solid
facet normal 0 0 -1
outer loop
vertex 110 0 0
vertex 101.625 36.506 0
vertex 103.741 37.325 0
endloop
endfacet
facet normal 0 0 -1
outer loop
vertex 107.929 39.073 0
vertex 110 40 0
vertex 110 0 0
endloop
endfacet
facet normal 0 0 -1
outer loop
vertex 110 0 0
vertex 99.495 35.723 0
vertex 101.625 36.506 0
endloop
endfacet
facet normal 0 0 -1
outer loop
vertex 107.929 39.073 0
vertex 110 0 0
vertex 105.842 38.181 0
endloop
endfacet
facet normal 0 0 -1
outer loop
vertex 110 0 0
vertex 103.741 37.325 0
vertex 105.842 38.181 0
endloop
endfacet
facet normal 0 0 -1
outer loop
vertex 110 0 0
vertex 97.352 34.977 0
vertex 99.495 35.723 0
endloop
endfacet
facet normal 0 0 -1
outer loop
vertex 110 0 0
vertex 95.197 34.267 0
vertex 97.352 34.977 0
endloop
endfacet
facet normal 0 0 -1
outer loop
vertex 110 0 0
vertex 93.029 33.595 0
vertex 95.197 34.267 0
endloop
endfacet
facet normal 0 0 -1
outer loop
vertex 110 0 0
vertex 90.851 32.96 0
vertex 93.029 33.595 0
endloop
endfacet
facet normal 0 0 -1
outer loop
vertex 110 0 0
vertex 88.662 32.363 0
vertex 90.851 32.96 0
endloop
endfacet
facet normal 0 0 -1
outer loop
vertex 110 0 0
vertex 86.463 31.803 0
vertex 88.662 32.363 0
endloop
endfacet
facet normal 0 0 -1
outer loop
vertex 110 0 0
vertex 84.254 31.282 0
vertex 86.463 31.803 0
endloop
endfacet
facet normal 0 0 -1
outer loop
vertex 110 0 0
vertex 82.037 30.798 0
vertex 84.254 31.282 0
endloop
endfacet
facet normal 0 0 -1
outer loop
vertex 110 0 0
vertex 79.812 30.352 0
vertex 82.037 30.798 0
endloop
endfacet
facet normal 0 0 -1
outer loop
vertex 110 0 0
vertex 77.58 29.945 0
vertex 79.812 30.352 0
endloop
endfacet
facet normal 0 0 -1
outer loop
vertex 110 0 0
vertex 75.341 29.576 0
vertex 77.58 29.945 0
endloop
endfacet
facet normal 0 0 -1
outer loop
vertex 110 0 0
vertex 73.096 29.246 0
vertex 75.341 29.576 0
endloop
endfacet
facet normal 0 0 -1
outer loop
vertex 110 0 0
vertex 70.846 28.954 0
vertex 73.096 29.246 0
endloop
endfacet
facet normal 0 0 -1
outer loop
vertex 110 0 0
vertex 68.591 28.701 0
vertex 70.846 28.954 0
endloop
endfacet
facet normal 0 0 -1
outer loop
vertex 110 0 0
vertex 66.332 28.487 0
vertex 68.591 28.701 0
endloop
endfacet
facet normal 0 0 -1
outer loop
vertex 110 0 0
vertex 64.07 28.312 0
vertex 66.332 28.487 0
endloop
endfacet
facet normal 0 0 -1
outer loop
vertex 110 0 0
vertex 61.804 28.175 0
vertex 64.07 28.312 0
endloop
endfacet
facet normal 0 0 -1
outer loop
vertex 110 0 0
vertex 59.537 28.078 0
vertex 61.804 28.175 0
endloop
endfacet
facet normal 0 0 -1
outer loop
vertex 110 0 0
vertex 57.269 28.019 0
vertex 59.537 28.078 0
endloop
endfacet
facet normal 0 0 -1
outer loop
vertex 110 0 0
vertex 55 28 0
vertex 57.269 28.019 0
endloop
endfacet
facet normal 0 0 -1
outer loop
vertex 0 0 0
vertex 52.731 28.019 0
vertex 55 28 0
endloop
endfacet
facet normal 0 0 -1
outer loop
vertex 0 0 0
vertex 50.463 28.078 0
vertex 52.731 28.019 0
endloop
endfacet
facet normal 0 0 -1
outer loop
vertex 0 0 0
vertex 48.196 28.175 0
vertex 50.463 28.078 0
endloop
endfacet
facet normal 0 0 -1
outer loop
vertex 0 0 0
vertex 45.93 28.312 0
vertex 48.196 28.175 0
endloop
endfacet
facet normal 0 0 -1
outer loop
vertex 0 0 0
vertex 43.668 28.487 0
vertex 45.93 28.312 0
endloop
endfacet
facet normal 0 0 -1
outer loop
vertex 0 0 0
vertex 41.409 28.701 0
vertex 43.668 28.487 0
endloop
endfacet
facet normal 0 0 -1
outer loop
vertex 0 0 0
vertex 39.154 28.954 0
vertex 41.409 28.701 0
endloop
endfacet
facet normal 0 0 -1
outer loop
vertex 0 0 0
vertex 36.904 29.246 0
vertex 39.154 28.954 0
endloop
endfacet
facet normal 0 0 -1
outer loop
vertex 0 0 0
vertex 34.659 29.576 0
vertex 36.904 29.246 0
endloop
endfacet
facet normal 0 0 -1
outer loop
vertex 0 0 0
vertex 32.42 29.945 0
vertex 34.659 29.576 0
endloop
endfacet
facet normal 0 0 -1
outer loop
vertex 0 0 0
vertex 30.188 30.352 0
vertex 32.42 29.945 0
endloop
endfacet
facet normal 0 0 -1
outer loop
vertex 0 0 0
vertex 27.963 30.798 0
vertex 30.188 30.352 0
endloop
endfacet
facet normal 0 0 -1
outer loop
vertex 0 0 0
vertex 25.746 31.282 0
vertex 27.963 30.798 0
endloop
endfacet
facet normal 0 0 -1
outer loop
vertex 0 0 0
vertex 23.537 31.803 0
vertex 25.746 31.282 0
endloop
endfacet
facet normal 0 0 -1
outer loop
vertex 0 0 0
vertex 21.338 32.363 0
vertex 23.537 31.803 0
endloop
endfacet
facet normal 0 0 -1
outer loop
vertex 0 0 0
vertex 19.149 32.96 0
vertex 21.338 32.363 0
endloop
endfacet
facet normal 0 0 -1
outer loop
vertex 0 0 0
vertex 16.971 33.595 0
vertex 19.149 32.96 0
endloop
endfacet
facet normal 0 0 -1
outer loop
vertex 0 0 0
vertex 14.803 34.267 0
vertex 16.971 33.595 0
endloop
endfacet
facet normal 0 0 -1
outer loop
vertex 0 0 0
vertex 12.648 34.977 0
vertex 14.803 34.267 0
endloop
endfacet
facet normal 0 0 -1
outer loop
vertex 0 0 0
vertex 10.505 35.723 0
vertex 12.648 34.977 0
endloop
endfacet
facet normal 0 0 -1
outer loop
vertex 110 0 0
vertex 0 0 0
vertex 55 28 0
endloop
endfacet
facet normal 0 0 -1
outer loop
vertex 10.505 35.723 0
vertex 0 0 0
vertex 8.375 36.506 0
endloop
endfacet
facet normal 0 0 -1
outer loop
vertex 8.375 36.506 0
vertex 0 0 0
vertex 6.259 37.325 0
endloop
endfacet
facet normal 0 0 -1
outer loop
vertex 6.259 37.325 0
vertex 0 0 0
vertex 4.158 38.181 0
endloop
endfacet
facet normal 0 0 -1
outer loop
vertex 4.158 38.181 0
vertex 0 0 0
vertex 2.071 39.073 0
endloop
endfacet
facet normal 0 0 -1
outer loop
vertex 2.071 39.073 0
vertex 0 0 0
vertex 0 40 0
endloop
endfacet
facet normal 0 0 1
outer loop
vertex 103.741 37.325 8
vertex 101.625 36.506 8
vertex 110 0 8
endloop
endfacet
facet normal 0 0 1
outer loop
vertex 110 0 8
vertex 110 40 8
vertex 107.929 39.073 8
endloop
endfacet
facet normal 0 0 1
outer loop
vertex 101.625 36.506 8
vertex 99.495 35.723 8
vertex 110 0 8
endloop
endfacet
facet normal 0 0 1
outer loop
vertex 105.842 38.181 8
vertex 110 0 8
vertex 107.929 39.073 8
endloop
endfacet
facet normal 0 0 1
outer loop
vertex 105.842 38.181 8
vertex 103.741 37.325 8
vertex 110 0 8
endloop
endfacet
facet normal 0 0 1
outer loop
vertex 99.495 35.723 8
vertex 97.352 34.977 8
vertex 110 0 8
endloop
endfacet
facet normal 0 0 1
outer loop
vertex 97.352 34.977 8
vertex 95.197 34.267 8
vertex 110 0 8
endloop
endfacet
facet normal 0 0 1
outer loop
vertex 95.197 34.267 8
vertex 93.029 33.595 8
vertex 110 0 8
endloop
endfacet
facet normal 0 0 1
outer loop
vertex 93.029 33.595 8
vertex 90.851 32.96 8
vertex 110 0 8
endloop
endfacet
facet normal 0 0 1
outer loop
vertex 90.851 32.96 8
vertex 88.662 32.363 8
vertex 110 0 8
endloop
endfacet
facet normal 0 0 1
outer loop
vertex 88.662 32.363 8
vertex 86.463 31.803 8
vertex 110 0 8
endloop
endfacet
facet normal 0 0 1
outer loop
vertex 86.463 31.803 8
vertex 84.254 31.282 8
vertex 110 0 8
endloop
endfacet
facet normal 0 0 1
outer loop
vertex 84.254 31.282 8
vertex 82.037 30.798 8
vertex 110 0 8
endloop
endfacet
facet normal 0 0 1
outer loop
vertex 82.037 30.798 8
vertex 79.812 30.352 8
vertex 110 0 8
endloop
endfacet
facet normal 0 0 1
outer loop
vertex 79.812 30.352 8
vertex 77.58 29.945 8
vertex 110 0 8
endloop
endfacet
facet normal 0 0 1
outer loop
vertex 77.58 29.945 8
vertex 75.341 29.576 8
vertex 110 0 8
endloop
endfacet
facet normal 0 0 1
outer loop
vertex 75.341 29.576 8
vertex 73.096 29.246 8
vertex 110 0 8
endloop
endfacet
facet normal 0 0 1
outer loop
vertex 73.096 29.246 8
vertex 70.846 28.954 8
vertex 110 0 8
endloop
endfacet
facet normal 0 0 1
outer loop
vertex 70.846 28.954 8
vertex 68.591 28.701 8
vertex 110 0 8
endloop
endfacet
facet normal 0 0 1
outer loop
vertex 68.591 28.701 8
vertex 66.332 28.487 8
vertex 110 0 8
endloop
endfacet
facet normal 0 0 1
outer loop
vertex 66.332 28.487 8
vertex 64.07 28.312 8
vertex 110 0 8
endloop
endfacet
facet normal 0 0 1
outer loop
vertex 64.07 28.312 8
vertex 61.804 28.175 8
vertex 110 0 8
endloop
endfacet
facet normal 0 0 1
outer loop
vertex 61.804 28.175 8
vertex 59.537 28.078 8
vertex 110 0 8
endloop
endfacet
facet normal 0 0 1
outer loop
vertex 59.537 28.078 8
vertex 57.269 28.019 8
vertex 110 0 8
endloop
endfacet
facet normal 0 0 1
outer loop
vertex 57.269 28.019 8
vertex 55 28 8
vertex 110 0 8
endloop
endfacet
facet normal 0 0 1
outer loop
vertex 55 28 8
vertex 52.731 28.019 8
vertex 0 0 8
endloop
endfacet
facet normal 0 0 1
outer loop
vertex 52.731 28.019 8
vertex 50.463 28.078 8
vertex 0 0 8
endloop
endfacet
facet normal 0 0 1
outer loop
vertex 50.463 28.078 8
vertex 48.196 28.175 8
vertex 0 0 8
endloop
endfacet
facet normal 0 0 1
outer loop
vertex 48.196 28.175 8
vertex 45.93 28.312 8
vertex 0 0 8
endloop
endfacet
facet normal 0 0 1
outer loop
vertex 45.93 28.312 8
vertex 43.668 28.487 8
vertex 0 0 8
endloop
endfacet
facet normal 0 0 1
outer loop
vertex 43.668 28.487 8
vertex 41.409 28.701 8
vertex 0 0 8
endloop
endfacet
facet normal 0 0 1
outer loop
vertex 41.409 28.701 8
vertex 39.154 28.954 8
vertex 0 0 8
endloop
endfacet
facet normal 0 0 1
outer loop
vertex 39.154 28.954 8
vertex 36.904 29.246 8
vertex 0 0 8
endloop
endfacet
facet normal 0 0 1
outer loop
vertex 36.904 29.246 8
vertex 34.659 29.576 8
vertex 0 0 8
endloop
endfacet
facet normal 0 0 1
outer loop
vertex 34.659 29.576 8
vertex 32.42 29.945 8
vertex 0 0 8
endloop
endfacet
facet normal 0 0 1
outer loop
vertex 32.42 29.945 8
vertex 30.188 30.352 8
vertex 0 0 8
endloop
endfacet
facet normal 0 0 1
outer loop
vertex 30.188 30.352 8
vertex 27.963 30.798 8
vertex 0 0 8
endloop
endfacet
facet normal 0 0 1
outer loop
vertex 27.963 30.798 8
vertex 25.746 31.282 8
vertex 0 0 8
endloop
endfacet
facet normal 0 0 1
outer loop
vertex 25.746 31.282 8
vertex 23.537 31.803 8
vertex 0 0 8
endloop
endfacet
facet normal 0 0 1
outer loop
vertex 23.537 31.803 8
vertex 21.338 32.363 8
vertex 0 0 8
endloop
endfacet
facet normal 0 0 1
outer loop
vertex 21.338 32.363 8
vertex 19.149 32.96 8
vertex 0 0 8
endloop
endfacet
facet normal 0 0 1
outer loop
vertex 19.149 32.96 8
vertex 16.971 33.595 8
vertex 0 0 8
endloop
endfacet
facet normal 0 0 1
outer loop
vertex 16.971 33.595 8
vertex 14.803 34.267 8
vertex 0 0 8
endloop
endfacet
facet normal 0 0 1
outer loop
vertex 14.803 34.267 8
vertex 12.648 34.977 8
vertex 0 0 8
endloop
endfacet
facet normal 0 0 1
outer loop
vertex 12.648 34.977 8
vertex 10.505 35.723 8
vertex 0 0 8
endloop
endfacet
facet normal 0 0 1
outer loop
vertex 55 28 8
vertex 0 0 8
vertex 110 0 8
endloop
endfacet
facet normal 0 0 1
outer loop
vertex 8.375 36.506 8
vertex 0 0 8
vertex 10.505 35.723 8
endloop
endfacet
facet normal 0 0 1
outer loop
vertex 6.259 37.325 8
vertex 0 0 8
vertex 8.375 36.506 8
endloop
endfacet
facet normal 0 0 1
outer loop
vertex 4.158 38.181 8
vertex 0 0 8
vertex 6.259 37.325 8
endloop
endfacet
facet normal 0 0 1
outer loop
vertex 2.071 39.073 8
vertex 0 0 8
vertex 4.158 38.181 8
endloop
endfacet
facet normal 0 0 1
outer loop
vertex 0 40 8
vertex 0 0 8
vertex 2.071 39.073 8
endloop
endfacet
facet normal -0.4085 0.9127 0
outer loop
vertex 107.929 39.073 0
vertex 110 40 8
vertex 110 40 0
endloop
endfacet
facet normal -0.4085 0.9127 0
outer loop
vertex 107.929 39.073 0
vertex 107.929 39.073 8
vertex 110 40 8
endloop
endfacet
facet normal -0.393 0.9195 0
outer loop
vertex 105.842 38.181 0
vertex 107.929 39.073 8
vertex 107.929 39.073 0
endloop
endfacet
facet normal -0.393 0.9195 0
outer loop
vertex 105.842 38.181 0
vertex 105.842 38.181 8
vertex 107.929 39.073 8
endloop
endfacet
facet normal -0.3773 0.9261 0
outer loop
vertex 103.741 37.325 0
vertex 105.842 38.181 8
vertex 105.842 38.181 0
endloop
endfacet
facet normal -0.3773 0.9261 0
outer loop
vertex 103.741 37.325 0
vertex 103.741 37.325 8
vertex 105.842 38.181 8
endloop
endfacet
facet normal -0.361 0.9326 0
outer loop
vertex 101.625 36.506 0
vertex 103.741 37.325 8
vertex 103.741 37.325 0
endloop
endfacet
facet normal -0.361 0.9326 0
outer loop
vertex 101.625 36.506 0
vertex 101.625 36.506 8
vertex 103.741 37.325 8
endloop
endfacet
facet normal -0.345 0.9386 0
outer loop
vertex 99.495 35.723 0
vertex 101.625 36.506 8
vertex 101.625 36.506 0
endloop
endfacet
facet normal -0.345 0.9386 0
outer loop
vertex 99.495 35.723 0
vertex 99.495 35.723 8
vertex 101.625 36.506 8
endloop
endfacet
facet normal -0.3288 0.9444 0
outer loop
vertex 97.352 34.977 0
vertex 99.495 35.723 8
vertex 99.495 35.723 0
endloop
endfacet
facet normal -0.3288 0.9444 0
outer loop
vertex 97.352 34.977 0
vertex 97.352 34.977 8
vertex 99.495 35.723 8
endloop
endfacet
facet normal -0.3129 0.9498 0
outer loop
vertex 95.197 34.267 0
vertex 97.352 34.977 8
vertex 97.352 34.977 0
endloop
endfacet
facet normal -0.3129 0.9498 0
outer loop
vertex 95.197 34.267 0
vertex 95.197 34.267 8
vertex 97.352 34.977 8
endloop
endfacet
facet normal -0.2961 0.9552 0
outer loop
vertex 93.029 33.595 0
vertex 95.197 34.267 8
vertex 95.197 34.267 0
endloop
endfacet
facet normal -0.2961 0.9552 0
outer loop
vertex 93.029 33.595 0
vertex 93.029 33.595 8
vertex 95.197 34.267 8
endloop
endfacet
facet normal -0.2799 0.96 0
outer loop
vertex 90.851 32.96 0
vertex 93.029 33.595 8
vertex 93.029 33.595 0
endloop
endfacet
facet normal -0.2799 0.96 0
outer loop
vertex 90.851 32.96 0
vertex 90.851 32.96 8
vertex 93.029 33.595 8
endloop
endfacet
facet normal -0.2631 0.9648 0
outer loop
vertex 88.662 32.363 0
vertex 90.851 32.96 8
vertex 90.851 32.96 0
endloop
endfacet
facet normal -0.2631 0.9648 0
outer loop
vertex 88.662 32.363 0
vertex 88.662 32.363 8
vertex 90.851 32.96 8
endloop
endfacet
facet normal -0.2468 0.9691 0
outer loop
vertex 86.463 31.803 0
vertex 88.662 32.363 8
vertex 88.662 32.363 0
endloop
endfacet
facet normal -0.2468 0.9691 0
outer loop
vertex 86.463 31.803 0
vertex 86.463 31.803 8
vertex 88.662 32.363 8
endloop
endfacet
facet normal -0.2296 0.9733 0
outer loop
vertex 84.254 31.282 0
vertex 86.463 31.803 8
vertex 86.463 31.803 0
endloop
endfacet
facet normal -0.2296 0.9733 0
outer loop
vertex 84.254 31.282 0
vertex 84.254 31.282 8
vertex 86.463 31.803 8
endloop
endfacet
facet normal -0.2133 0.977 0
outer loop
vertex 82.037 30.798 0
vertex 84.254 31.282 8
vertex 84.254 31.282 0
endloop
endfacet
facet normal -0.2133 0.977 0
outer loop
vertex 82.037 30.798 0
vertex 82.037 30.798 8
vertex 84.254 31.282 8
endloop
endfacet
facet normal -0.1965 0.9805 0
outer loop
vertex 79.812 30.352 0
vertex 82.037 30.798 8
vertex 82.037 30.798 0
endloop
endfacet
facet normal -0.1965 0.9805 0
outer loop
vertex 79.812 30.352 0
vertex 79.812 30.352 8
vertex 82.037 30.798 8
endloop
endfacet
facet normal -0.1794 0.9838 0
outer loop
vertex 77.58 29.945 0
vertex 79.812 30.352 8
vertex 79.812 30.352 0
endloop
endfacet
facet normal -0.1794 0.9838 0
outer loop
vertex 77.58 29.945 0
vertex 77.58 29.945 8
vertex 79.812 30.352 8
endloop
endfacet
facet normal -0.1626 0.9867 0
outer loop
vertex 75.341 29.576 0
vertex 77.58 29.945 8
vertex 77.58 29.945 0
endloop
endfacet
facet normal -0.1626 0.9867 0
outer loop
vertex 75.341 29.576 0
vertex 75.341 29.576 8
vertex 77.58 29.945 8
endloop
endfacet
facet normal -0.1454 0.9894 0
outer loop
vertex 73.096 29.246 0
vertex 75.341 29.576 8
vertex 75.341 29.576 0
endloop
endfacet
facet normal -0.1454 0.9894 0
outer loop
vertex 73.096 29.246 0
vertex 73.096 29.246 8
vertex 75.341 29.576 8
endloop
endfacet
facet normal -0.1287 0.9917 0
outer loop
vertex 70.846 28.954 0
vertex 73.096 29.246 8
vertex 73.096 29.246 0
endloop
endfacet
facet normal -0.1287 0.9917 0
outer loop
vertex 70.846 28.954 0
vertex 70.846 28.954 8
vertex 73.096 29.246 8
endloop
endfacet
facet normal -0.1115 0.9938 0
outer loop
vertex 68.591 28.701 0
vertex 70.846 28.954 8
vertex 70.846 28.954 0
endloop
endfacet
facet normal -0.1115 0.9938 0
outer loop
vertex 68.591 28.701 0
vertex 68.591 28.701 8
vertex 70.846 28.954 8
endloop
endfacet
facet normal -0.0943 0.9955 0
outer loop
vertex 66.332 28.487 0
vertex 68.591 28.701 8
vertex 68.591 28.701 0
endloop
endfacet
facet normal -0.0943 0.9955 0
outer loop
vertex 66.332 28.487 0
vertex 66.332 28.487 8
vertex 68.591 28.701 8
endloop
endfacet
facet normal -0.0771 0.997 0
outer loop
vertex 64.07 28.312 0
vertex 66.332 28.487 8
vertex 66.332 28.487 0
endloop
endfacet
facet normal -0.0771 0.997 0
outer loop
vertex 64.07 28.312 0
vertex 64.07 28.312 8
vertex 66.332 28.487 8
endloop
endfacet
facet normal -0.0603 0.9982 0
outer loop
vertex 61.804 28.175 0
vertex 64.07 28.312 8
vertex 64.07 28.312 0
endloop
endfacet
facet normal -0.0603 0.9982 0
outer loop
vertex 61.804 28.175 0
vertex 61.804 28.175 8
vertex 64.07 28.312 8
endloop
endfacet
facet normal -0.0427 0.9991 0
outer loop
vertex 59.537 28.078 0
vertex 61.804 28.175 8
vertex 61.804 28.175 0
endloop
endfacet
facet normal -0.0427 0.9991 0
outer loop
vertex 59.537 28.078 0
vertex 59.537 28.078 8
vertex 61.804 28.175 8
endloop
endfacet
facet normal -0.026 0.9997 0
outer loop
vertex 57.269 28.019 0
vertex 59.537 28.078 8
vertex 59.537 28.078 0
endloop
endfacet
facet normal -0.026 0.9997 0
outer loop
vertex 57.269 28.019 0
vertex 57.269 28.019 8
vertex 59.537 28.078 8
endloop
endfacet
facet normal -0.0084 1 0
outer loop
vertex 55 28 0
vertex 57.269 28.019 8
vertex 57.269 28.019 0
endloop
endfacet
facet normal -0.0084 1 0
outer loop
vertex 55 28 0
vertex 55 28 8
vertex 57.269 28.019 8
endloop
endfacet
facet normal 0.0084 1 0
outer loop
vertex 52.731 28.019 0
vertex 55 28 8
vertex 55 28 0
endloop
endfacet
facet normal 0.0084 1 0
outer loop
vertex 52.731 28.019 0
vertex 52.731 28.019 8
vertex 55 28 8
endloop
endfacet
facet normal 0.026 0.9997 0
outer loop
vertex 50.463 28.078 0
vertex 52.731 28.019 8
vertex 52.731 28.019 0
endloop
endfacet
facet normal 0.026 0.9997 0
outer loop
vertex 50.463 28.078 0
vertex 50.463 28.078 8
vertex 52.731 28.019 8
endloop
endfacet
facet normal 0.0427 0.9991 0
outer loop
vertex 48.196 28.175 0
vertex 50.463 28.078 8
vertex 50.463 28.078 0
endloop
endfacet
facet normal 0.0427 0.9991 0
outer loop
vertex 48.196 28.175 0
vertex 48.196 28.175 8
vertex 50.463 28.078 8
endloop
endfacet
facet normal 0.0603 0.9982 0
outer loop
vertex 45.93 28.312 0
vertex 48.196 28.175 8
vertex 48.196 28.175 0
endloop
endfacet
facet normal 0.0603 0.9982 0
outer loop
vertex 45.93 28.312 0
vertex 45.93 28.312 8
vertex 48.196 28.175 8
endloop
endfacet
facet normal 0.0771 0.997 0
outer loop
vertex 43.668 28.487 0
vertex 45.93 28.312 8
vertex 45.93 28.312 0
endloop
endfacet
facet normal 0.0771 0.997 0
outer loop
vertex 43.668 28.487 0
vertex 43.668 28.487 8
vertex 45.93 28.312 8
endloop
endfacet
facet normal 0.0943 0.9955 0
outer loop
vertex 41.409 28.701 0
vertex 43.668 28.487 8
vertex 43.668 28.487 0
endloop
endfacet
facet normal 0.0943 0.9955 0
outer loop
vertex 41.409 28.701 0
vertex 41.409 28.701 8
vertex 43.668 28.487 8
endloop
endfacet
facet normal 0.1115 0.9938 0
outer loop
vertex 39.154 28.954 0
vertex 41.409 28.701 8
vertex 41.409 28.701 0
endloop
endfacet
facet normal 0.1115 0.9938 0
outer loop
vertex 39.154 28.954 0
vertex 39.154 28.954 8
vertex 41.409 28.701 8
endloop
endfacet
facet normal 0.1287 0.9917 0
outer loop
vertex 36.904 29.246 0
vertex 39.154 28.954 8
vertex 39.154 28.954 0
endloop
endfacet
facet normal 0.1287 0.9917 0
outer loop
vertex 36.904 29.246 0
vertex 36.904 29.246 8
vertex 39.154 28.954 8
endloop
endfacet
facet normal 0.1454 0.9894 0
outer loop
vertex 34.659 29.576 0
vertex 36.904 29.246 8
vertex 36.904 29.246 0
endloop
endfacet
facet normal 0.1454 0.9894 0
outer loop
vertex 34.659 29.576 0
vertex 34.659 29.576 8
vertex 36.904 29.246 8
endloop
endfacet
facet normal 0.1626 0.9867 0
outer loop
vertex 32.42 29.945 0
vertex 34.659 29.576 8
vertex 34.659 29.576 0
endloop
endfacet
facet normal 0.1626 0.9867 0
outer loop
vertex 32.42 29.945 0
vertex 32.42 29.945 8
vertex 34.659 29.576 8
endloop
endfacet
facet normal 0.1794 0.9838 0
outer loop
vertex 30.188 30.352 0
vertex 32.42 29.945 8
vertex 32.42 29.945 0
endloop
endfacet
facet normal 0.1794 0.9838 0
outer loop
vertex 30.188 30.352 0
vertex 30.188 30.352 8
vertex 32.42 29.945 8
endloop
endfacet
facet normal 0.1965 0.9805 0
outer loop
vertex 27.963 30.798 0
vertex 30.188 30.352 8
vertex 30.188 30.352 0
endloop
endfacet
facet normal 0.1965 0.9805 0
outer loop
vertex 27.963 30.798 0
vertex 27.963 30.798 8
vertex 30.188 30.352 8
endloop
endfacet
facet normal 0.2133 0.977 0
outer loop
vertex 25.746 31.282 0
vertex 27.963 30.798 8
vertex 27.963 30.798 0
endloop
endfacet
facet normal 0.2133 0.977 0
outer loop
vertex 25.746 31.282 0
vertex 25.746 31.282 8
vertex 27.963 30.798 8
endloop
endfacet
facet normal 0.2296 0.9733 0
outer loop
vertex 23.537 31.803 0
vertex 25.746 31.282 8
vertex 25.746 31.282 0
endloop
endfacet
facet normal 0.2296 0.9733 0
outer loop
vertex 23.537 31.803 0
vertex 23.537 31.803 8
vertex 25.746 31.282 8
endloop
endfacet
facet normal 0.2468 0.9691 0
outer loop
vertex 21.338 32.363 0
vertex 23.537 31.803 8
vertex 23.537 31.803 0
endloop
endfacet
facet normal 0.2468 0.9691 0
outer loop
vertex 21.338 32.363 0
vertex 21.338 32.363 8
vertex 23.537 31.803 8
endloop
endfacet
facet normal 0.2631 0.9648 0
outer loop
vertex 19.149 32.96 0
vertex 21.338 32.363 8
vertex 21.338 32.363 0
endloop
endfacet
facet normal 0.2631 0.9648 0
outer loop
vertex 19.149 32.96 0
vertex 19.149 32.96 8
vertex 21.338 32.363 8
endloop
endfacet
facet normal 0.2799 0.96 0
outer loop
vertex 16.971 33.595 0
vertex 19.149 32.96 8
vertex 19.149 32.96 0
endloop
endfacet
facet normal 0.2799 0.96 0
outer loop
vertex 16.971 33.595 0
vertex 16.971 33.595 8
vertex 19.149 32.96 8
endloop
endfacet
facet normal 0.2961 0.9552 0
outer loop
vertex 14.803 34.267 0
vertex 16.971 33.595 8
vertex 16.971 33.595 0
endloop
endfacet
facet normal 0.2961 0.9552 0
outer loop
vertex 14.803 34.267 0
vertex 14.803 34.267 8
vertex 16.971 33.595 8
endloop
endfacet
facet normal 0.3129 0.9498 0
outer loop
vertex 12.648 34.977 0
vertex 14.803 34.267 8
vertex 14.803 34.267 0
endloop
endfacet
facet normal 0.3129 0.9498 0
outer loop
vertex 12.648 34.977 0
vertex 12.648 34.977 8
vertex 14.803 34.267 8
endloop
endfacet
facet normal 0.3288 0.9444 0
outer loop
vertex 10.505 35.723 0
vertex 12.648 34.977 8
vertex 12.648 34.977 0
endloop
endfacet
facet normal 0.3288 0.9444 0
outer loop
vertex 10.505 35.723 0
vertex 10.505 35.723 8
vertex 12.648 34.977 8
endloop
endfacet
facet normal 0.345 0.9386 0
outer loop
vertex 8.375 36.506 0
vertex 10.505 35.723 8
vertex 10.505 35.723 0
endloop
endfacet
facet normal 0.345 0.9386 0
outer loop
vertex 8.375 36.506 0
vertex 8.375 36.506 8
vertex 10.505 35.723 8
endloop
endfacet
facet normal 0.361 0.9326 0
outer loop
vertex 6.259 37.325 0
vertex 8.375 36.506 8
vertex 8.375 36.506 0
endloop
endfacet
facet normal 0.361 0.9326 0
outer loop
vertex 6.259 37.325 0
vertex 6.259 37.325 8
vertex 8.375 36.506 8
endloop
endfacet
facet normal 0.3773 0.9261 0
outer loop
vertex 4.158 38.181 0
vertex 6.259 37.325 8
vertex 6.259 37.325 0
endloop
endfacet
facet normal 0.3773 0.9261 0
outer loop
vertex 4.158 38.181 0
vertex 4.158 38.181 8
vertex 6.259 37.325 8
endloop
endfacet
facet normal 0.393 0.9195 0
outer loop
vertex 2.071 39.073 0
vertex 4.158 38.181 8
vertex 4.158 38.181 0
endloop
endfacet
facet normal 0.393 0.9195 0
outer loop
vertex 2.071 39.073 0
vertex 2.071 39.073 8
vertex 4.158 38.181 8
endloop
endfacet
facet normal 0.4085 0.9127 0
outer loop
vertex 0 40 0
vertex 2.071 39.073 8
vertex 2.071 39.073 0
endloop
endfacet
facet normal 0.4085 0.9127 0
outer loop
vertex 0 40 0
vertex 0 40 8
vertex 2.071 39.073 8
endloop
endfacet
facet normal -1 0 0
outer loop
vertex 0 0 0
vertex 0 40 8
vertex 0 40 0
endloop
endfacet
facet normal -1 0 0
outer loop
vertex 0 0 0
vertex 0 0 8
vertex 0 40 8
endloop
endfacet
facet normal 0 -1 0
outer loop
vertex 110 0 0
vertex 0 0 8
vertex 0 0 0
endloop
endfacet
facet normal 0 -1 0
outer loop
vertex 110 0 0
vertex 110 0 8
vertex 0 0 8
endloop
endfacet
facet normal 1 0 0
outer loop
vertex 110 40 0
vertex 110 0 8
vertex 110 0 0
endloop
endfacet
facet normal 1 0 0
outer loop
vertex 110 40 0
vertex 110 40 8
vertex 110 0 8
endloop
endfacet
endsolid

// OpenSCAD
$fn = 32;

// ----------------------------------------------------------------------
// Arc profile plate: notch, 53 points
// ----------------------------------------------------------------------

// --- parameters (mm) ---
bar_l = 110;              // bar length, X
bar_w = 40;               // bar width, Y
notch_depth = 12;         // depth of the arc notch at mid-span
arc_r = 132.04;           // radius of the notch arc
arc_angle = 49.23;        // notch arc angle, degrees
arc_step = 1;             // sampling step of the notch arc, degrees
plate_t = 8;              // plate thickness, Z

profile = [[0, 0], [110, 0], [110, 40], [107.929, 39.073], [105.842, 38.181], [103.741, 37.325], [101.625, 36.506], [99.495, 35.723], [97.352, 34.977], [95.197, 34.267], [93.029, 33.595], [90.851, 32.96], [88.662, 32.363], [86.463, 31.803], [84.254, 31.282], [82.037, 30.798], [79.812, 30.352], [77.58, 29.945], [75.341, 29.576], [73.096, 29.246], [70.846, 28.954], [68.591, 28.701], [66.332, 28.487], [64.07, 28.312], [61.804, 28.175], [59.537, 28.078], [57.269, 28.019], [55, 28], [52.731, 28.019], [50.463, 28.078], [48.196, 28.175], [45.93, 28.312], [43.668, 28.487], [41.409, 28.701], [39.154, 28.954], [36.904, 29.246], [34.659, 29.576], [32.42, 29.945], [30.188, 30.352], [27.963, 30.798], [25.746, 31.282], [23.537, 31.803], [21.338, 32.363], [19.149, 32.96], [16.971, 33.595], [14.803, 34.267], [12.648, 34.977], [10.505, 35.723], [8.375, 36.506], [6.259, 37.325], [4.158, 38.181], [2.071, 39.073], [0, 40]];  // primary outline, 53 points, counter clockwise

// --- the one profile operation ---
linear_extrude(height = plate_t) polygon(points = profile);
